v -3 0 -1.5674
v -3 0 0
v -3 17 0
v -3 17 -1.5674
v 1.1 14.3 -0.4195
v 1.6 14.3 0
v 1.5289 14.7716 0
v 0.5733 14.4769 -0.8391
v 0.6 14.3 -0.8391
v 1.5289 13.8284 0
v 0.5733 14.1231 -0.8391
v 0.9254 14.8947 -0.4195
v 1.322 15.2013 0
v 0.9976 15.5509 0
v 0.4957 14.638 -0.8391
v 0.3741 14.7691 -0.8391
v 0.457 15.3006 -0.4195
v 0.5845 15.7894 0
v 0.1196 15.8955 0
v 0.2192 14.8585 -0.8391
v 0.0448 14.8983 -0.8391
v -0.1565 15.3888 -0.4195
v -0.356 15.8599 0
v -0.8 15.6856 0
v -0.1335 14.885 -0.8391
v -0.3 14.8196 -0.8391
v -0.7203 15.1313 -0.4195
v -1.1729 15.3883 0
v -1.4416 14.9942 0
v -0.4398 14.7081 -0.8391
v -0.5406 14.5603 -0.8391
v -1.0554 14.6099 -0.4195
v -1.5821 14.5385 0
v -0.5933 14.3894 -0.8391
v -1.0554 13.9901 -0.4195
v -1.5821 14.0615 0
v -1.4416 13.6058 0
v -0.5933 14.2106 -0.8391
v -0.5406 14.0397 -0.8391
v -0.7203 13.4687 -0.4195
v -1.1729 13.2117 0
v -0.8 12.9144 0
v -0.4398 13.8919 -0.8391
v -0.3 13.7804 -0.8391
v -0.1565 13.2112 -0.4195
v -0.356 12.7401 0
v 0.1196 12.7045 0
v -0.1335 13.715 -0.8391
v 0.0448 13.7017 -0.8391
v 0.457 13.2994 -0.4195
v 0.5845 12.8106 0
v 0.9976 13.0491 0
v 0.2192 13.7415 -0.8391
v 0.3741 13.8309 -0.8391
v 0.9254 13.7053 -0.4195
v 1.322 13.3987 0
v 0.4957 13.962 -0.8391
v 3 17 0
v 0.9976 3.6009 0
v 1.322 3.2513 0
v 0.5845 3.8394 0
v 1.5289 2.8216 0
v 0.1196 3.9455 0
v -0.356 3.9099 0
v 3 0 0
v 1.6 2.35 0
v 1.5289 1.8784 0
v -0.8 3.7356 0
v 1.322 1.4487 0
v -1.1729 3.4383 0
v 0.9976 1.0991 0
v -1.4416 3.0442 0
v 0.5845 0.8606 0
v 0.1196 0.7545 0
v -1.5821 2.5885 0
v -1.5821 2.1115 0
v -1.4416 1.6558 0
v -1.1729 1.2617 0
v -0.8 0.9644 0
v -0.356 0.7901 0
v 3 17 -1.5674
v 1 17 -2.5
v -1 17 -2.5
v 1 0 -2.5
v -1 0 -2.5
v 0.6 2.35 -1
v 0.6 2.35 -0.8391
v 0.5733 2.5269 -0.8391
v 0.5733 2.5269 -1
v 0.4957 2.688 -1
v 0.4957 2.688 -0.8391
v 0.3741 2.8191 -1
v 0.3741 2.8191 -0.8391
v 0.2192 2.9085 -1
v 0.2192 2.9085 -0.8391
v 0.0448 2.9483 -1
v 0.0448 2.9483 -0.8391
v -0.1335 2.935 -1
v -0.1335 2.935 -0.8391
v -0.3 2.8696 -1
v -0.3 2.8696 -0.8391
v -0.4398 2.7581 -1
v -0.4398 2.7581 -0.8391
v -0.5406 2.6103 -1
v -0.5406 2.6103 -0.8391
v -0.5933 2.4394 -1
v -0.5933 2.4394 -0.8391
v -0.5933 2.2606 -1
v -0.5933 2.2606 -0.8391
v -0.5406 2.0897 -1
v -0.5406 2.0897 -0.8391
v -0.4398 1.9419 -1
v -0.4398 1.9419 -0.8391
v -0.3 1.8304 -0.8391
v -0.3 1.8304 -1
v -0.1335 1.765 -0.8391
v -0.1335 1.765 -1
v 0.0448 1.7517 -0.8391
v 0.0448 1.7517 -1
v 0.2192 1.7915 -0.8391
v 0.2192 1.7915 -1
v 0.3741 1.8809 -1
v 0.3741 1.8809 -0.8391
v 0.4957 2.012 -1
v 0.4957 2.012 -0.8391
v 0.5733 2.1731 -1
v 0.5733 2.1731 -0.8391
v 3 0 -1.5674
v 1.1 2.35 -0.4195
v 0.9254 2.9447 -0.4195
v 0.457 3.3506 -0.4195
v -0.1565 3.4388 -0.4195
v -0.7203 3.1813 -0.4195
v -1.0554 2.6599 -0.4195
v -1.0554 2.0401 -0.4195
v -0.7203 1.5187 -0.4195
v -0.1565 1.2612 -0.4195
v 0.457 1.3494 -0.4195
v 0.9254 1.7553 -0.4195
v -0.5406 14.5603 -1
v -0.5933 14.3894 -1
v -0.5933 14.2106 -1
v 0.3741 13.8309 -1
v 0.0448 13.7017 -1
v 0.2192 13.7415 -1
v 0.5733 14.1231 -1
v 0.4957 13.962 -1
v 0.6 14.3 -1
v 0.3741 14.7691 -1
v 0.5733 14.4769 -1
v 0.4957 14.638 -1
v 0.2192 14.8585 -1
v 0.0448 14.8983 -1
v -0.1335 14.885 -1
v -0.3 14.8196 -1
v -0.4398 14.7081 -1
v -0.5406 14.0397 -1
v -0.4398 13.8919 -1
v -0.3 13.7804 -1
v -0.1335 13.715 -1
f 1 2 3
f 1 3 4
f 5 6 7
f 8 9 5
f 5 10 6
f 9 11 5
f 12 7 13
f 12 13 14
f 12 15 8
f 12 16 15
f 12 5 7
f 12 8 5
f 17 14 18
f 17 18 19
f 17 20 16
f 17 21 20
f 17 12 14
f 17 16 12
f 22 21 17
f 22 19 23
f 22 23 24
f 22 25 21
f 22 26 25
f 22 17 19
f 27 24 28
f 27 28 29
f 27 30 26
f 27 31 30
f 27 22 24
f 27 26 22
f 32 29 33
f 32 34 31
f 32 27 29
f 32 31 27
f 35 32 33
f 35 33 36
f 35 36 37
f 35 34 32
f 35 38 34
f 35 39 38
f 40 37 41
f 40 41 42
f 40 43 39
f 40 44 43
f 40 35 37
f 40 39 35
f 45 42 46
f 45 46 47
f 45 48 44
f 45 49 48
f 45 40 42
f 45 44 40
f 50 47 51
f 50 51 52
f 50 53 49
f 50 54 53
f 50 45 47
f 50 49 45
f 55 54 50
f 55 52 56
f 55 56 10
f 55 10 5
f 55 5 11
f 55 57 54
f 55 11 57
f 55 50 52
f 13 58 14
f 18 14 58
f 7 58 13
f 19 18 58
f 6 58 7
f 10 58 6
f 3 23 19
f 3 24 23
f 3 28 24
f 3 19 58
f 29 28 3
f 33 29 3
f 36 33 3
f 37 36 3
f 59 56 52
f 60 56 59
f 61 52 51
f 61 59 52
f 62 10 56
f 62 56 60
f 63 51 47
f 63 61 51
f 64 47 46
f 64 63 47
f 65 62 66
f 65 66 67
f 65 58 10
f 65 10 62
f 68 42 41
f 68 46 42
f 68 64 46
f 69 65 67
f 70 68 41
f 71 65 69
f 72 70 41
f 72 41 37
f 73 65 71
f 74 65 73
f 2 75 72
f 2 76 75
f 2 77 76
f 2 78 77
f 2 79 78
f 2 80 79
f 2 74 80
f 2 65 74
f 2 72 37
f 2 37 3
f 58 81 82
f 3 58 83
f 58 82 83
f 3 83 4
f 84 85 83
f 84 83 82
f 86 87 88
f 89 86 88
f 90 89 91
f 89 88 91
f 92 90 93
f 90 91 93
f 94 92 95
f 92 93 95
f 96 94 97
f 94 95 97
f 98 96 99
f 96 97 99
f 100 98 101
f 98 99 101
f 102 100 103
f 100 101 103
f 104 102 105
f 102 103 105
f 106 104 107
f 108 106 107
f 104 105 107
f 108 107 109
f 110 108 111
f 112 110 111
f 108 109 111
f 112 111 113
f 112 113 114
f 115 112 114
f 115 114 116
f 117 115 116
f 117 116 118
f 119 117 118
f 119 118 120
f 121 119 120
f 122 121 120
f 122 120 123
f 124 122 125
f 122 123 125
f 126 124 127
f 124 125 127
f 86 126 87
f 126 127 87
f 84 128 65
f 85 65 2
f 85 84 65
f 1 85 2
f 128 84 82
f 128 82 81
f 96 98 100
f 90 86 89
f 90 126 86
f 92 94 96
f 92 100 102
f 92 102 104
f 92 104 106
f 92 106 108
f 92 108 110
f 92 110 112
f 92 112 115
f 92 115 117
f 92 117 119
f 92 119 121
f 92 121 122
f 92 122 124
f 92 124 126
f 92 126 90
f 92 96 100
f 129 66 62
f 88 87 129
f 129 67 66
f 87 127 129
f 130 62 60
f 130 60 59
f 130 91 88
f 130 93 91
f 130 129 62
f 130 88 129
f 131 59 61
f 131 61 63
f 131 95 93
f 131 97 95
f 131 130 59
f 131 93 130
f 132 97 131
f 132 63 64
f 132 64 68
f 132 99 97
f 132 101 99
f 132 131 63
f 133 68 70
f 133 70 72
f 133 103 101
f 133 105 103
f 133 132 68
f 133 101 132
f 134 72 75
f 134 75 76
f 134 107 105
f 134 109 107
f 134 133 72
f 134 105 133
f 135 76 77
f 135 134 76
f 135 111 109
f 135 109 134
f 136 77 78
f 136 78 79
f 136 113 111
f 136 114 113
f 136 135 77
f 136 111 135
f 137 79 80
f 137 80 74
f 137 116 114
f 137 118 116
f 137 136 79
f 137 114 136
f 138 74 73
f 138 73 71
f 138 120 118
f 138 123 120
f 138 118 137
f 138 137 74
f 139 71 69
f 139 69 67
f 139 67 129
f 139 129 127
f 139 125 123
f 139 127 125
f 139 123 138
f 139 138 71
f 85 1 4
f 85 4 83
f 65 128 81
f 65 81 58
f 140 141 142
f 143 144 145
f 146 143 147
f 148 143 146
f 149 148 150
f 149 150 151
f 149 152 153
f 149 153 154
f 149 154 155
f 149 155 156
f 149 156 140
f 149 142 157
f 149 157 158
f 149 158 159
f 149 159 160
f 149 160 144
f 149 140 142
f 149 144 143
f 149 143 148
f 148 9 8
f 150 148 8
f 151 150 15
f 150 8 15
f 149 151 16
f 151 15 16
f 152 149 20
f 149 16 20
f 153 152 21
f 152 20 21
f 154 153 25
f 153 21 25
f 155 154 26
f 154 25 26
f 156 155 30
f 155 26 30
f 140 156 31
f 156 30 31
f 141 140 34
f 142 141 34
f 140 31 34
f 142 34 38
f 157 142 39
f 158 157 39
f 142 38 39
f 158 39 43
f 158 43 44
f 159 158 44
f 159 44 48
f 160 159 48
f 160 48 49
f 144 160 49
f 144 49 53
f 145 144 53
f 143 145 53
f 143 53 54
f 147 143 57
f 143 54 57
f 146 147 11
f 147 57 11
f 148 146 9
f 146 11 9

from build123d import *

# Parameters (mm, degrees)
EXTRUDE_1_DEPTH     = 17
SKETCH_2_R          = 0.6
CUT_EXTRUDE_1_DEPTH = 1
CHAMFER_1_SIZE      = 1
CHAMFER_1_SIZE2     = 0.839099631


with BuildPart() as part:
    # Эскиз1 → Бобышка-Вытянуть1 (new body)
    with BuildSketch(Plane(origin=(0, 0, 0), x_dir=(1, 0, 0), z_dir=(0, 1, 0))):
        Polygon((3, 0), (-3, 0), (-3, 1.567384684), (-1, 2.5), (1, 2.5), (3, 1.567384684), align=None)
    extrude(amount=EXTRUDE_1_DEPTH)

    # Эскиз2 → Вырез-Вытянуть1 (cut)
    with BuildSketch(Plane.XY):
        with Locations((0, 2.35)):
            Circle(SKETCH_2_R)
        with Locations((0, 14.3)):
            Circle(SKETCH_2_R)
    extrude(amount=-CUT_EXTRUDE_1_DEPTH, mode=Mode.SUBTRACT)

    # Фаска1
    chamfer_1_edges = [part.edges().sort_by_distance(p)[0] for p in [
        (-0.6, 2.35, 0),
        (-0.6, 14.3, 0),
    ]]
    chamfer_1_side = [part.faces().sort_by_distance(p)[0] for p in [
        (0, 8.503968803, 0),
    ]]
    chamfer(chamfer_1_edges, length=CHAMFER_1_SIZE, length2=CHAMFER_1_SIZE2, reference=chamfer_1_side[0])


solid = part.part
